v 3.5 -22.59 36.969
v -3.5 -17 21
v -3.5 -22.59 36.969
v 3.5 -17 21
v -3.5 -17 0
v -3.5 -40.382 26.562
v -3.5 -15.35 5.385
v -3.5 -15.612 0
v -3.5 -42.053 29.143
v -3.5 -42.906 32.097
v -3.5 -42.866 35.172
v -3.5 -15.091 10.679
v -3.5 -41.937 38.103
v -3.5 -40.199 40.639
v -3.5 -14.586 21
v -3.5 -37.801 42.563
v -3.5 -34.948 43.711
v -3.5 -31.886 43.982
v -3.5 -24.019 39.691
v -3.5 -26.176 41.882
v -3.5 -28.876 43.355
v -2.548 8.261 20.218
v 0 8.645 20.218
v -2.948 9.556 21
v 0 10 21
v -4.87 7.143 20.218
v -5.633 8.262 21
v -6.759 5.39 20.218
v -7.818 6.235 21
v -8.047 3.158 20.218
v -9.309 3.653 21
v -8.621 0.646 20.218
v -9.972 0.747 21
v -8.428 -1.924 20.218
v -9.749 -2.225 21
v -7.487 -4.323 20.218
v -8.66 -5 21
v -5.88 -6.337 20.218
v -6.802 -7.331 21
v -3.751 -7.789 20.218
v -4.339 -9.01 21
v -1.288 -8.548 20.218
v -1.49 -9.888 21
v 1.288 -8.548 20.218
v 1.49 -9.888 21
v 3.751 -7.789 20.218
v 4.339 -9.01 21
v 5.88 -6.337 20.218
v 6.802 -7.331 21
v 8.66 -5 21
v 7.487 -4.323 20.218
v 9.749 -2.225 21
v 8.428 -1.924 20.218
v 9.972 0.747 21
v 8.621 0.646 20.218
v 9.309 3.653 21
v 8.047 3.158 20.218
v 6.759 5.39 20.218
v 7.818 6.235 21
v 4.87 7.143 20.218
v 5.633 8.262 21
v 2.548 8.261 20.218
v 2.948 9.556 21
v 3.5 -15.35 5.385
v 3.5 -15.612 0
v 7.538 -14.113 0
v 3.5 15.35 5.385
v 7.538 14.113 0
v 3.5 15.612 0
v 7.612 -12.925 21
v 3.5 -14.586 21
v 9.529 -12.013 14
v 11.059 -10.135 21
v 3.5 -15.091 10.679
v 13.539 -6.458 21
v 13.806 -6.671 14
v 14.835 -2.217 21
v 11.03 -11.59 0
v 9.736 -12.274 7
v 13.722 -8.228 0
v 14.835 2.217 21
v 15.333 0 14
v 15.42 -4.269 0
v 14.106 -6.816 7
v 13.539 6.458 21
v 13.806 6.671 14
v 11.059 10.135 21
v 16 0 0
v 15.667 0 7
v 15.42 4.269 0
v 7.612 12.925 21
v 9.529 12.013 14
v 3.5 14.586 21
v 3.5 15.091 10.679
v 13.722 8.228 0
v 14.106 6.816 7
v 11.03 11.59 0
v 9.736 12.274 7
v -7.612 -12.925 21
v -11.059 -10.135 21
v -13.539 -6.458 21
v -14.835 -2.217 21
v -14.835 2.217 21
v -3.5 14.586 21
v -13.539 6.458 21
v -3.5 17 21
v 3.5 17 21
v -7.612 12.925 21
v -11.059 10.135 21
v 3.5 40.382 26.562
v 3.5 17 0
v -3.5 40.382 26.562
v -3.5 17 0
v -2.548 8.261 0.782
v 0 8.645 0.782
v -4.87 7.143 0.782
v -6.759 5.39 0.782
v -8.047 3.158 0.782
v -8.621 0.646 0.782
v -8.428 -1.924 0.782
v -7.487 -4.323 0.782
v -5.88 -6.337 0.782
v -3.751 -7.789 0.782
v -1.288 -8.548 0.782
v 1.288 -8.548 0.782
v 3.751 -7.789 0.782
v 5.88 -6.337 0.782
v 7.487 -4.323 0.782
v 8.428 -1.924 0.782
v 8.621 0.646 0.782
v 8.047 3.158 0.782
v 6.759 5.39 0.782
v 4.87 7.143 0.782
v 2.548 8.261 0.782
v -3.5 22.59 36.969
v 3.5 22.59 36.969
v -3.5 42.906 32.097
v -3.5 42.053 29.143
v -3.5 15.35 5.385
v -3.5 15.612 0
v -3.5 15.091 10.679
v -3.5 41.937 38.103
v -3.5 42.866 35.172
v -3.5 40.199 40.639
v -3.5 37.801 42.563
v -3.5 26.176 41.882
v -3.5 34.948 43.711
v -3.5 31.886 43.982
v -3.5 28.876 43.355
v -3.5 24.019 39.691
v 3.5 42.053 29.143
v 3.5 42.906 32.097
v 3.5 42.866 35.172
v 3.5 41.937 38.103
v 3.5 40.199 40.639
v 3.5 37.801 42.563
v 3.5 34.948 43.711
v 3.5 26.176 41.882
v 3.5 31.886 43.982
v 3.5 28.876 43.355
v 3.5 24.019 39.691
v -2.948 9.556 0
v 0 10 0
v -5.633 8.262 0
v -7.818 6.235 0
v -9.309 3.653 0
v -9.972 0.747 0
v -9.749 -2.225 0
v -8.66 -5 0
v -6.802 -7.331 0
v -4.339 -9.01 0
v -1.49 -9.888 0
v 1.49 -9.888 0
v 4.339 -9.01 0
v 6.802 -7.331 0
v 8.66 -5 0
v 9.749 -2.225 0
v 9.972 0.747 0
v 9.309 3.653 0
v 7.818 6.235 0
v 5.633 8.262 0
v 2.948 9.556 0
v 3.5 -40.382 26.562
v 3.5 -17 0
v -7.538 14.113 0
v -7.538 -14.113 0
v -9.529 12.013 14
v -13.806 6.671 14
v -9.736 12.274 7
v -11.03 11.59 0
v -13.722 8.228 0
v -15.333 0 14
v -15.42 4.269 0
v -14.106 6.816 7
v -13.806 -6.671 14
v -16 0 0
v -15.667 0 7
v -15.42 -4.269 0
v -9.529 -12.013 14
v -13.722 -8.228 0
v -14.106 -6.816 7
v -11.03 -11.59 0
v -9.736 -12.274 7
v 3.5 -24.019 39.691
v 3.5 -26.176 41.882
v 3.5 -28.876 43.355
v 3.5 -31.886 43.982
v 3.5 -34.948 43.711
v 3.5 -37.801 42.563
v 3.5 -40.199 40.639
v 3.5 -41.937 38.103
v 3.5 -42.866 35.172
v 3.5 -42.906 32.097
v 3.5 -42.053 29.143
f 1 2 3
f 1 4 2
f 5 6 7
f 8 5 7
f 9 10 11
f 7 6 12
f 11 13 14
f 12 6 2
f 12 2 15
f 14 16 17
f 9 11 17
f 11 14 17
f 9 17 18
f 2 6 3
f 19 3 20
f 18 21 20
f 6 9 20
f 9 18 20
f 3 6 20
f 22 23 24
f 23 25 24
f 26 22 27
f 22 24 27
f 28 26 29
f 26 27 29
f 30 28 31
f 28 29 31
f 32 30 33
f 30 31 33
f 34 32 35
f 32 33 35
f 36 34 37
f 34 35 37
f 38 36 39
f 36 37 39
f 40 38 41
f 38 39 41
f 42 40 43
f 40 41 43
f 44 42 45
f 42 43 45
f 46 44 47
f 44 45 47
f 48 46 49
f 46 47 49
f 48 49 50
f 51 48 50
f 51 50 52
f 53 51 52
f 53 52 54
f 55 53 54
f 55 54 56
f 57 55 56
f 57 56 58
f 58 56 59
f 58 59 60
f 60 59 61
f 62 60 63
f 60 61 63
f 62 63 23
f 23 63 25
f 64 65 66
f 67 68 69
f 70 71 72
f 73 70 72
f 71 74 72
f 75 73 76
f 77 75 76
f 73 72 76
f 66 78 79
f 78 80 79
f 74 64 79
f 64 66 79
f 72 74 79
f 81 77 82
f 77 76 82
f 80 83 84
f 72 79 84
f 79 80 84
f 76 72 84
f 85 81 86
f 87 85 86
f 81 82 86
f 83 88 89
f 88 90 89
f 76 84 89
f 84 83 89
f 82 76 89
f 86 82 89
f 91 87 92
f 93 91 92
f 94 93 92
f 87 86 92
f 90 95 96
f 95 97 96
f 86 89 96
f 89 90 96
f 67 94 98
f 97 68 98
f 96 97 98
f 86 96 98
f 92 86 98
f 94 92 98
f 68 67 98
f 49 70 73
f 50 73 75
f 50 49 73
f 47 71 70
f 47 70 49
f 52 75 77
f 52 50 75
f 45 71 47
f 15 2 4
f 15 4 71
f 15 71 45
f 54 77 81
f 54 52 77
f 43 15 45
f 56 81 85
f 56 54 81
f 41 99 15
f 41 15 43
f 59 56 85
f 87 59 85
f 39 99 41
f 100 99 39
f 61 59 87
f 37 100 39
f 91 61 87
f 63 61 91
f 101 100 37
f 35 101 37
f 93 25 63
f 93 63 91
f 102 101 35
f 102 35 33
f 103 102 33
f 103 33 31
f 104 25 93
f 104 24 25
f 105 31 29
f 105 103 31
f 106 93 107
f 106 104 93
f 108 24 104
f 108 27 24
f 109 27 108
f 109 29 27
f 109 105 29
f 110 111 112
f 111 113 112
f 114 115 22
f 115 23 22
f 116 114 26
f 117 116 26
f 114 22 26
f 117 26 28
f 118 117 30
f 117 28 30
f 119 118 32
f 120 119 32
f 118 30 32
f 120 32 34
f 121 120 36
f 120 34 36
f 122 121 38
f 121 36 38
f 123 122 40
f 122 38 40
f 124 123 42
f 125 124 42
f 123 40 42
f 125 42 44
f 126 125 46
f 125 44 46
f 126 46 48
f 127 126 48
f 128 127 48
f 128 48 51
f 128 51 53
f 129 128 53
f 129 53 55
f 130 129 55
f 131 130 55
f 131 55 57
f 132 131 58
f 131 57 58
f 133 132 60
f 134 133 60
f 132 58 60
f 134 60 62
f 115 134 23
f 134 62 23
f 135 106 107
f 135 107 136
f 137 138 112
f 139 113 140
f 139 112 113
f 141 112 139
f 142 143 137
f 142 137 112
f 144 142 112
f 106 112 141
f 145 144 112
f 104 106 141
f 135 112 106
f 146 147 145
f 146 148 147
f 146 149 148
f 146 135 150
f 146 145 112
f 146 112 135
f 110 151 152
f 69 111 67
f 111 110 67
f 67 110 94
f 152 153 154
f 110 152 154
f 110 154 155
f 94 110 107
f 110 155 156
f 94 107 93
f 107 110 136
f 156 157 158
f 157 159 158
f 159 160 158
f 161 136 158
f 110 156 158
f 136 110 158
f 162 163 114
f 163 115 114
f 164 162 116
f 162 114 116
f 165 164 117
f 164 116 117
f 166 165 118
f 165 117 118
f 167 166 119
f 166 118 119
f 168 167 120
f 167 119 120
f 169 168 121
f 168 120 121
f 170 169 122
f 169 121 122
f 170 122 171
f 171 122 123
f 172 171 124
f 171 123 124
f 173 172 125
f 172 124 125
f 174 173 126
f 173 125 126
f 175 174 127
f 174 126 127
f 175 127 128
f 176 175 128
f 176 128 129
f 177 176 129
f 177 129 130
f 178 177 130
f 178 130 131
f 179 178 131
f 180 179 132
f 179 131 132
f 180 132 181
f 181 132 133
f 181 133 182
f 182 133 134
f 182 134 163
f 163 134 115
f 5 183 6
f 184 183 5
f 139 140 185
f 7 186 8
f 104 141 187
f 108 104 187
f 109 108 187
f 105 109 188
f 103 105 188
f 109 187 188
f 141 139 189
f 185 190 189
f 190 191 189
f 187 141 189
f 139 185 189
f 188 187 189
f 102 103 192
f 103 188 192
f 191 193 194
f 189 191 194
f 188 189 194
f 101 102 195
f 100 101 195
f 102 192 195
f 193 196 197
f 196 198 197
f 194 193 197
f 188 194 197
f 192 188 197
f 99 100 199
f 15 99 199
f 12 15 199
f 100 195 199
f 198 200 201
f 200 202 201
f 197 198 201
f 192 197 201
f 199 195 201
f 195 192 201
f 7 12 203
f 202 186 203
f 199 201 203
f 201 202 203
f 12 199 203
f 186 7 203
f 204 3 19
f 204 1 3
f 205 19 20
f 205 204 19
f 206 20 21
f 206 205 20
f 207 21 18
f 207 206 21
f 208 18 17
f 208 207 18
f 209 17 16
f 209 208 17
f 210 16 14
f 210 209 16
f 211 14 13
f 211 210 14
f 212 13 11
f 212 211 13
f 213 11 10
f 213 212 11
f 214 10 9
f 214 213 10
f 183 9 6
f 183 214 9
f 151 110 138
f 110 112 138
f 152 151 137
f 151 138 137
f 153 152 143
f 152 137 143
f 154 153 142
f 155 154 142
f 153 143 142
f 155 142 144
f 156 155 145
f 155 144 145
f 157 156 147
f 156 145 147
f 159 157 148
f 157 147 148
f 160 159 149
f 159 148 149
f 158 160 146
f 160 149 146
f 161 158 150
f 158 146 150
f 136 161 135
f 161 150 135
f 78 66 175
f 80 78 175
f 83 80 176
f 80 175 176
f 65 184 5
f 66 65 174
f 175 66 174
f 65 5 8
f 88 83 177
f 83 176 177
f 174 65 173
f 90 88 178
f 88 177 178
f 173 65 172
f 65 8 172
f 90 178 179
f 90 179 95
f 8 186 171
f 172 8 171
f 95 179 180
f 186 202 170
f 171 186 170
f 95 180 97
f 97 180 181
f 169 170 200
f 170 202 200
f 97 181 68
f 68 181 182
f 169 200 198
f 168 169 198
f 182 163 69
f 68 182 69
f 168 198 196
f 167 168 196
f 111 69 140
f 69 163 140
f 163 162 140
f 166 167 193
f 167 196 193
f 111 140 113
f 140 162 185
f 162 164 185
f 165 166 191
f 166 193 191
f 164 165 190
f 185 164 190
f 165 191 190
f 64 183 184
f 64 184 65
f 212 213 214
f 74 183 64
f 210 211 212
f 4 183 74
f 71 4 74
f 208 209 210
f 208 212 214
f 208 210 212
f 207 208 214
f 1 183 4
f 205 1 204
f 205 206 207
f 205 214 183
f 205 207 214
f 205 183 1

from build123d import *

# Parameters (mm, degrees)
PAD_DEPTH = 3.5


with BuildPart() as pad:
    # Sketch001 → Pad (new body, symmetric)
    with BuildSketch(Plane.YZ):
        with BuildLine():
            Line((11, 0), (11, 21))
            Line((11, 21), (17, 21))
            Line((17, 21), (22.589568, 36.968909))
            ThreePointArc((40.381508, 26.562289), (37.80128, 42.563467), (22.589568, 36.968909))
            Line((17, 0), (40.381508, 26.562289))
            Line((11, 0), (17, 0))
        make_face()
        with BuildLine():
            Line((-40.381517, 26.562321), (-17.000046, 0))
            Line((-17.000046, 0), (-11.000046, 0))
            Line((-11.000046, 0), (-11.000046, 21))
            Line((-11.000046, 21), (-17.000046, 21))
            Line((-17.000046, 21), (-22.589566, 36.968926))
            ThreePointArc((-22.589566, 36.968926), (-37.801272, 42.563494), (-40.381517, 26.562321))
        make_face()
    extrude(amount=PAD_DEPTH, both=True)


with BuildPart() as fl_gelmutter_din_315_m20:
    # Sketch → Revolution (revolve)
    with BuildSketch(Plane.YZ):
        Polygon((10, 0), (8.645, 0.78231), (8.645, 20.21769), (10, 21), (15, 21), (16, 0), align=None)
    revolve(axis=Axis((0, 0, 0), (0, 0, 1)))

    # Fusion: union Pad
    add(pad.part)


solid = fl_gelmutter_din_315_m20.part
